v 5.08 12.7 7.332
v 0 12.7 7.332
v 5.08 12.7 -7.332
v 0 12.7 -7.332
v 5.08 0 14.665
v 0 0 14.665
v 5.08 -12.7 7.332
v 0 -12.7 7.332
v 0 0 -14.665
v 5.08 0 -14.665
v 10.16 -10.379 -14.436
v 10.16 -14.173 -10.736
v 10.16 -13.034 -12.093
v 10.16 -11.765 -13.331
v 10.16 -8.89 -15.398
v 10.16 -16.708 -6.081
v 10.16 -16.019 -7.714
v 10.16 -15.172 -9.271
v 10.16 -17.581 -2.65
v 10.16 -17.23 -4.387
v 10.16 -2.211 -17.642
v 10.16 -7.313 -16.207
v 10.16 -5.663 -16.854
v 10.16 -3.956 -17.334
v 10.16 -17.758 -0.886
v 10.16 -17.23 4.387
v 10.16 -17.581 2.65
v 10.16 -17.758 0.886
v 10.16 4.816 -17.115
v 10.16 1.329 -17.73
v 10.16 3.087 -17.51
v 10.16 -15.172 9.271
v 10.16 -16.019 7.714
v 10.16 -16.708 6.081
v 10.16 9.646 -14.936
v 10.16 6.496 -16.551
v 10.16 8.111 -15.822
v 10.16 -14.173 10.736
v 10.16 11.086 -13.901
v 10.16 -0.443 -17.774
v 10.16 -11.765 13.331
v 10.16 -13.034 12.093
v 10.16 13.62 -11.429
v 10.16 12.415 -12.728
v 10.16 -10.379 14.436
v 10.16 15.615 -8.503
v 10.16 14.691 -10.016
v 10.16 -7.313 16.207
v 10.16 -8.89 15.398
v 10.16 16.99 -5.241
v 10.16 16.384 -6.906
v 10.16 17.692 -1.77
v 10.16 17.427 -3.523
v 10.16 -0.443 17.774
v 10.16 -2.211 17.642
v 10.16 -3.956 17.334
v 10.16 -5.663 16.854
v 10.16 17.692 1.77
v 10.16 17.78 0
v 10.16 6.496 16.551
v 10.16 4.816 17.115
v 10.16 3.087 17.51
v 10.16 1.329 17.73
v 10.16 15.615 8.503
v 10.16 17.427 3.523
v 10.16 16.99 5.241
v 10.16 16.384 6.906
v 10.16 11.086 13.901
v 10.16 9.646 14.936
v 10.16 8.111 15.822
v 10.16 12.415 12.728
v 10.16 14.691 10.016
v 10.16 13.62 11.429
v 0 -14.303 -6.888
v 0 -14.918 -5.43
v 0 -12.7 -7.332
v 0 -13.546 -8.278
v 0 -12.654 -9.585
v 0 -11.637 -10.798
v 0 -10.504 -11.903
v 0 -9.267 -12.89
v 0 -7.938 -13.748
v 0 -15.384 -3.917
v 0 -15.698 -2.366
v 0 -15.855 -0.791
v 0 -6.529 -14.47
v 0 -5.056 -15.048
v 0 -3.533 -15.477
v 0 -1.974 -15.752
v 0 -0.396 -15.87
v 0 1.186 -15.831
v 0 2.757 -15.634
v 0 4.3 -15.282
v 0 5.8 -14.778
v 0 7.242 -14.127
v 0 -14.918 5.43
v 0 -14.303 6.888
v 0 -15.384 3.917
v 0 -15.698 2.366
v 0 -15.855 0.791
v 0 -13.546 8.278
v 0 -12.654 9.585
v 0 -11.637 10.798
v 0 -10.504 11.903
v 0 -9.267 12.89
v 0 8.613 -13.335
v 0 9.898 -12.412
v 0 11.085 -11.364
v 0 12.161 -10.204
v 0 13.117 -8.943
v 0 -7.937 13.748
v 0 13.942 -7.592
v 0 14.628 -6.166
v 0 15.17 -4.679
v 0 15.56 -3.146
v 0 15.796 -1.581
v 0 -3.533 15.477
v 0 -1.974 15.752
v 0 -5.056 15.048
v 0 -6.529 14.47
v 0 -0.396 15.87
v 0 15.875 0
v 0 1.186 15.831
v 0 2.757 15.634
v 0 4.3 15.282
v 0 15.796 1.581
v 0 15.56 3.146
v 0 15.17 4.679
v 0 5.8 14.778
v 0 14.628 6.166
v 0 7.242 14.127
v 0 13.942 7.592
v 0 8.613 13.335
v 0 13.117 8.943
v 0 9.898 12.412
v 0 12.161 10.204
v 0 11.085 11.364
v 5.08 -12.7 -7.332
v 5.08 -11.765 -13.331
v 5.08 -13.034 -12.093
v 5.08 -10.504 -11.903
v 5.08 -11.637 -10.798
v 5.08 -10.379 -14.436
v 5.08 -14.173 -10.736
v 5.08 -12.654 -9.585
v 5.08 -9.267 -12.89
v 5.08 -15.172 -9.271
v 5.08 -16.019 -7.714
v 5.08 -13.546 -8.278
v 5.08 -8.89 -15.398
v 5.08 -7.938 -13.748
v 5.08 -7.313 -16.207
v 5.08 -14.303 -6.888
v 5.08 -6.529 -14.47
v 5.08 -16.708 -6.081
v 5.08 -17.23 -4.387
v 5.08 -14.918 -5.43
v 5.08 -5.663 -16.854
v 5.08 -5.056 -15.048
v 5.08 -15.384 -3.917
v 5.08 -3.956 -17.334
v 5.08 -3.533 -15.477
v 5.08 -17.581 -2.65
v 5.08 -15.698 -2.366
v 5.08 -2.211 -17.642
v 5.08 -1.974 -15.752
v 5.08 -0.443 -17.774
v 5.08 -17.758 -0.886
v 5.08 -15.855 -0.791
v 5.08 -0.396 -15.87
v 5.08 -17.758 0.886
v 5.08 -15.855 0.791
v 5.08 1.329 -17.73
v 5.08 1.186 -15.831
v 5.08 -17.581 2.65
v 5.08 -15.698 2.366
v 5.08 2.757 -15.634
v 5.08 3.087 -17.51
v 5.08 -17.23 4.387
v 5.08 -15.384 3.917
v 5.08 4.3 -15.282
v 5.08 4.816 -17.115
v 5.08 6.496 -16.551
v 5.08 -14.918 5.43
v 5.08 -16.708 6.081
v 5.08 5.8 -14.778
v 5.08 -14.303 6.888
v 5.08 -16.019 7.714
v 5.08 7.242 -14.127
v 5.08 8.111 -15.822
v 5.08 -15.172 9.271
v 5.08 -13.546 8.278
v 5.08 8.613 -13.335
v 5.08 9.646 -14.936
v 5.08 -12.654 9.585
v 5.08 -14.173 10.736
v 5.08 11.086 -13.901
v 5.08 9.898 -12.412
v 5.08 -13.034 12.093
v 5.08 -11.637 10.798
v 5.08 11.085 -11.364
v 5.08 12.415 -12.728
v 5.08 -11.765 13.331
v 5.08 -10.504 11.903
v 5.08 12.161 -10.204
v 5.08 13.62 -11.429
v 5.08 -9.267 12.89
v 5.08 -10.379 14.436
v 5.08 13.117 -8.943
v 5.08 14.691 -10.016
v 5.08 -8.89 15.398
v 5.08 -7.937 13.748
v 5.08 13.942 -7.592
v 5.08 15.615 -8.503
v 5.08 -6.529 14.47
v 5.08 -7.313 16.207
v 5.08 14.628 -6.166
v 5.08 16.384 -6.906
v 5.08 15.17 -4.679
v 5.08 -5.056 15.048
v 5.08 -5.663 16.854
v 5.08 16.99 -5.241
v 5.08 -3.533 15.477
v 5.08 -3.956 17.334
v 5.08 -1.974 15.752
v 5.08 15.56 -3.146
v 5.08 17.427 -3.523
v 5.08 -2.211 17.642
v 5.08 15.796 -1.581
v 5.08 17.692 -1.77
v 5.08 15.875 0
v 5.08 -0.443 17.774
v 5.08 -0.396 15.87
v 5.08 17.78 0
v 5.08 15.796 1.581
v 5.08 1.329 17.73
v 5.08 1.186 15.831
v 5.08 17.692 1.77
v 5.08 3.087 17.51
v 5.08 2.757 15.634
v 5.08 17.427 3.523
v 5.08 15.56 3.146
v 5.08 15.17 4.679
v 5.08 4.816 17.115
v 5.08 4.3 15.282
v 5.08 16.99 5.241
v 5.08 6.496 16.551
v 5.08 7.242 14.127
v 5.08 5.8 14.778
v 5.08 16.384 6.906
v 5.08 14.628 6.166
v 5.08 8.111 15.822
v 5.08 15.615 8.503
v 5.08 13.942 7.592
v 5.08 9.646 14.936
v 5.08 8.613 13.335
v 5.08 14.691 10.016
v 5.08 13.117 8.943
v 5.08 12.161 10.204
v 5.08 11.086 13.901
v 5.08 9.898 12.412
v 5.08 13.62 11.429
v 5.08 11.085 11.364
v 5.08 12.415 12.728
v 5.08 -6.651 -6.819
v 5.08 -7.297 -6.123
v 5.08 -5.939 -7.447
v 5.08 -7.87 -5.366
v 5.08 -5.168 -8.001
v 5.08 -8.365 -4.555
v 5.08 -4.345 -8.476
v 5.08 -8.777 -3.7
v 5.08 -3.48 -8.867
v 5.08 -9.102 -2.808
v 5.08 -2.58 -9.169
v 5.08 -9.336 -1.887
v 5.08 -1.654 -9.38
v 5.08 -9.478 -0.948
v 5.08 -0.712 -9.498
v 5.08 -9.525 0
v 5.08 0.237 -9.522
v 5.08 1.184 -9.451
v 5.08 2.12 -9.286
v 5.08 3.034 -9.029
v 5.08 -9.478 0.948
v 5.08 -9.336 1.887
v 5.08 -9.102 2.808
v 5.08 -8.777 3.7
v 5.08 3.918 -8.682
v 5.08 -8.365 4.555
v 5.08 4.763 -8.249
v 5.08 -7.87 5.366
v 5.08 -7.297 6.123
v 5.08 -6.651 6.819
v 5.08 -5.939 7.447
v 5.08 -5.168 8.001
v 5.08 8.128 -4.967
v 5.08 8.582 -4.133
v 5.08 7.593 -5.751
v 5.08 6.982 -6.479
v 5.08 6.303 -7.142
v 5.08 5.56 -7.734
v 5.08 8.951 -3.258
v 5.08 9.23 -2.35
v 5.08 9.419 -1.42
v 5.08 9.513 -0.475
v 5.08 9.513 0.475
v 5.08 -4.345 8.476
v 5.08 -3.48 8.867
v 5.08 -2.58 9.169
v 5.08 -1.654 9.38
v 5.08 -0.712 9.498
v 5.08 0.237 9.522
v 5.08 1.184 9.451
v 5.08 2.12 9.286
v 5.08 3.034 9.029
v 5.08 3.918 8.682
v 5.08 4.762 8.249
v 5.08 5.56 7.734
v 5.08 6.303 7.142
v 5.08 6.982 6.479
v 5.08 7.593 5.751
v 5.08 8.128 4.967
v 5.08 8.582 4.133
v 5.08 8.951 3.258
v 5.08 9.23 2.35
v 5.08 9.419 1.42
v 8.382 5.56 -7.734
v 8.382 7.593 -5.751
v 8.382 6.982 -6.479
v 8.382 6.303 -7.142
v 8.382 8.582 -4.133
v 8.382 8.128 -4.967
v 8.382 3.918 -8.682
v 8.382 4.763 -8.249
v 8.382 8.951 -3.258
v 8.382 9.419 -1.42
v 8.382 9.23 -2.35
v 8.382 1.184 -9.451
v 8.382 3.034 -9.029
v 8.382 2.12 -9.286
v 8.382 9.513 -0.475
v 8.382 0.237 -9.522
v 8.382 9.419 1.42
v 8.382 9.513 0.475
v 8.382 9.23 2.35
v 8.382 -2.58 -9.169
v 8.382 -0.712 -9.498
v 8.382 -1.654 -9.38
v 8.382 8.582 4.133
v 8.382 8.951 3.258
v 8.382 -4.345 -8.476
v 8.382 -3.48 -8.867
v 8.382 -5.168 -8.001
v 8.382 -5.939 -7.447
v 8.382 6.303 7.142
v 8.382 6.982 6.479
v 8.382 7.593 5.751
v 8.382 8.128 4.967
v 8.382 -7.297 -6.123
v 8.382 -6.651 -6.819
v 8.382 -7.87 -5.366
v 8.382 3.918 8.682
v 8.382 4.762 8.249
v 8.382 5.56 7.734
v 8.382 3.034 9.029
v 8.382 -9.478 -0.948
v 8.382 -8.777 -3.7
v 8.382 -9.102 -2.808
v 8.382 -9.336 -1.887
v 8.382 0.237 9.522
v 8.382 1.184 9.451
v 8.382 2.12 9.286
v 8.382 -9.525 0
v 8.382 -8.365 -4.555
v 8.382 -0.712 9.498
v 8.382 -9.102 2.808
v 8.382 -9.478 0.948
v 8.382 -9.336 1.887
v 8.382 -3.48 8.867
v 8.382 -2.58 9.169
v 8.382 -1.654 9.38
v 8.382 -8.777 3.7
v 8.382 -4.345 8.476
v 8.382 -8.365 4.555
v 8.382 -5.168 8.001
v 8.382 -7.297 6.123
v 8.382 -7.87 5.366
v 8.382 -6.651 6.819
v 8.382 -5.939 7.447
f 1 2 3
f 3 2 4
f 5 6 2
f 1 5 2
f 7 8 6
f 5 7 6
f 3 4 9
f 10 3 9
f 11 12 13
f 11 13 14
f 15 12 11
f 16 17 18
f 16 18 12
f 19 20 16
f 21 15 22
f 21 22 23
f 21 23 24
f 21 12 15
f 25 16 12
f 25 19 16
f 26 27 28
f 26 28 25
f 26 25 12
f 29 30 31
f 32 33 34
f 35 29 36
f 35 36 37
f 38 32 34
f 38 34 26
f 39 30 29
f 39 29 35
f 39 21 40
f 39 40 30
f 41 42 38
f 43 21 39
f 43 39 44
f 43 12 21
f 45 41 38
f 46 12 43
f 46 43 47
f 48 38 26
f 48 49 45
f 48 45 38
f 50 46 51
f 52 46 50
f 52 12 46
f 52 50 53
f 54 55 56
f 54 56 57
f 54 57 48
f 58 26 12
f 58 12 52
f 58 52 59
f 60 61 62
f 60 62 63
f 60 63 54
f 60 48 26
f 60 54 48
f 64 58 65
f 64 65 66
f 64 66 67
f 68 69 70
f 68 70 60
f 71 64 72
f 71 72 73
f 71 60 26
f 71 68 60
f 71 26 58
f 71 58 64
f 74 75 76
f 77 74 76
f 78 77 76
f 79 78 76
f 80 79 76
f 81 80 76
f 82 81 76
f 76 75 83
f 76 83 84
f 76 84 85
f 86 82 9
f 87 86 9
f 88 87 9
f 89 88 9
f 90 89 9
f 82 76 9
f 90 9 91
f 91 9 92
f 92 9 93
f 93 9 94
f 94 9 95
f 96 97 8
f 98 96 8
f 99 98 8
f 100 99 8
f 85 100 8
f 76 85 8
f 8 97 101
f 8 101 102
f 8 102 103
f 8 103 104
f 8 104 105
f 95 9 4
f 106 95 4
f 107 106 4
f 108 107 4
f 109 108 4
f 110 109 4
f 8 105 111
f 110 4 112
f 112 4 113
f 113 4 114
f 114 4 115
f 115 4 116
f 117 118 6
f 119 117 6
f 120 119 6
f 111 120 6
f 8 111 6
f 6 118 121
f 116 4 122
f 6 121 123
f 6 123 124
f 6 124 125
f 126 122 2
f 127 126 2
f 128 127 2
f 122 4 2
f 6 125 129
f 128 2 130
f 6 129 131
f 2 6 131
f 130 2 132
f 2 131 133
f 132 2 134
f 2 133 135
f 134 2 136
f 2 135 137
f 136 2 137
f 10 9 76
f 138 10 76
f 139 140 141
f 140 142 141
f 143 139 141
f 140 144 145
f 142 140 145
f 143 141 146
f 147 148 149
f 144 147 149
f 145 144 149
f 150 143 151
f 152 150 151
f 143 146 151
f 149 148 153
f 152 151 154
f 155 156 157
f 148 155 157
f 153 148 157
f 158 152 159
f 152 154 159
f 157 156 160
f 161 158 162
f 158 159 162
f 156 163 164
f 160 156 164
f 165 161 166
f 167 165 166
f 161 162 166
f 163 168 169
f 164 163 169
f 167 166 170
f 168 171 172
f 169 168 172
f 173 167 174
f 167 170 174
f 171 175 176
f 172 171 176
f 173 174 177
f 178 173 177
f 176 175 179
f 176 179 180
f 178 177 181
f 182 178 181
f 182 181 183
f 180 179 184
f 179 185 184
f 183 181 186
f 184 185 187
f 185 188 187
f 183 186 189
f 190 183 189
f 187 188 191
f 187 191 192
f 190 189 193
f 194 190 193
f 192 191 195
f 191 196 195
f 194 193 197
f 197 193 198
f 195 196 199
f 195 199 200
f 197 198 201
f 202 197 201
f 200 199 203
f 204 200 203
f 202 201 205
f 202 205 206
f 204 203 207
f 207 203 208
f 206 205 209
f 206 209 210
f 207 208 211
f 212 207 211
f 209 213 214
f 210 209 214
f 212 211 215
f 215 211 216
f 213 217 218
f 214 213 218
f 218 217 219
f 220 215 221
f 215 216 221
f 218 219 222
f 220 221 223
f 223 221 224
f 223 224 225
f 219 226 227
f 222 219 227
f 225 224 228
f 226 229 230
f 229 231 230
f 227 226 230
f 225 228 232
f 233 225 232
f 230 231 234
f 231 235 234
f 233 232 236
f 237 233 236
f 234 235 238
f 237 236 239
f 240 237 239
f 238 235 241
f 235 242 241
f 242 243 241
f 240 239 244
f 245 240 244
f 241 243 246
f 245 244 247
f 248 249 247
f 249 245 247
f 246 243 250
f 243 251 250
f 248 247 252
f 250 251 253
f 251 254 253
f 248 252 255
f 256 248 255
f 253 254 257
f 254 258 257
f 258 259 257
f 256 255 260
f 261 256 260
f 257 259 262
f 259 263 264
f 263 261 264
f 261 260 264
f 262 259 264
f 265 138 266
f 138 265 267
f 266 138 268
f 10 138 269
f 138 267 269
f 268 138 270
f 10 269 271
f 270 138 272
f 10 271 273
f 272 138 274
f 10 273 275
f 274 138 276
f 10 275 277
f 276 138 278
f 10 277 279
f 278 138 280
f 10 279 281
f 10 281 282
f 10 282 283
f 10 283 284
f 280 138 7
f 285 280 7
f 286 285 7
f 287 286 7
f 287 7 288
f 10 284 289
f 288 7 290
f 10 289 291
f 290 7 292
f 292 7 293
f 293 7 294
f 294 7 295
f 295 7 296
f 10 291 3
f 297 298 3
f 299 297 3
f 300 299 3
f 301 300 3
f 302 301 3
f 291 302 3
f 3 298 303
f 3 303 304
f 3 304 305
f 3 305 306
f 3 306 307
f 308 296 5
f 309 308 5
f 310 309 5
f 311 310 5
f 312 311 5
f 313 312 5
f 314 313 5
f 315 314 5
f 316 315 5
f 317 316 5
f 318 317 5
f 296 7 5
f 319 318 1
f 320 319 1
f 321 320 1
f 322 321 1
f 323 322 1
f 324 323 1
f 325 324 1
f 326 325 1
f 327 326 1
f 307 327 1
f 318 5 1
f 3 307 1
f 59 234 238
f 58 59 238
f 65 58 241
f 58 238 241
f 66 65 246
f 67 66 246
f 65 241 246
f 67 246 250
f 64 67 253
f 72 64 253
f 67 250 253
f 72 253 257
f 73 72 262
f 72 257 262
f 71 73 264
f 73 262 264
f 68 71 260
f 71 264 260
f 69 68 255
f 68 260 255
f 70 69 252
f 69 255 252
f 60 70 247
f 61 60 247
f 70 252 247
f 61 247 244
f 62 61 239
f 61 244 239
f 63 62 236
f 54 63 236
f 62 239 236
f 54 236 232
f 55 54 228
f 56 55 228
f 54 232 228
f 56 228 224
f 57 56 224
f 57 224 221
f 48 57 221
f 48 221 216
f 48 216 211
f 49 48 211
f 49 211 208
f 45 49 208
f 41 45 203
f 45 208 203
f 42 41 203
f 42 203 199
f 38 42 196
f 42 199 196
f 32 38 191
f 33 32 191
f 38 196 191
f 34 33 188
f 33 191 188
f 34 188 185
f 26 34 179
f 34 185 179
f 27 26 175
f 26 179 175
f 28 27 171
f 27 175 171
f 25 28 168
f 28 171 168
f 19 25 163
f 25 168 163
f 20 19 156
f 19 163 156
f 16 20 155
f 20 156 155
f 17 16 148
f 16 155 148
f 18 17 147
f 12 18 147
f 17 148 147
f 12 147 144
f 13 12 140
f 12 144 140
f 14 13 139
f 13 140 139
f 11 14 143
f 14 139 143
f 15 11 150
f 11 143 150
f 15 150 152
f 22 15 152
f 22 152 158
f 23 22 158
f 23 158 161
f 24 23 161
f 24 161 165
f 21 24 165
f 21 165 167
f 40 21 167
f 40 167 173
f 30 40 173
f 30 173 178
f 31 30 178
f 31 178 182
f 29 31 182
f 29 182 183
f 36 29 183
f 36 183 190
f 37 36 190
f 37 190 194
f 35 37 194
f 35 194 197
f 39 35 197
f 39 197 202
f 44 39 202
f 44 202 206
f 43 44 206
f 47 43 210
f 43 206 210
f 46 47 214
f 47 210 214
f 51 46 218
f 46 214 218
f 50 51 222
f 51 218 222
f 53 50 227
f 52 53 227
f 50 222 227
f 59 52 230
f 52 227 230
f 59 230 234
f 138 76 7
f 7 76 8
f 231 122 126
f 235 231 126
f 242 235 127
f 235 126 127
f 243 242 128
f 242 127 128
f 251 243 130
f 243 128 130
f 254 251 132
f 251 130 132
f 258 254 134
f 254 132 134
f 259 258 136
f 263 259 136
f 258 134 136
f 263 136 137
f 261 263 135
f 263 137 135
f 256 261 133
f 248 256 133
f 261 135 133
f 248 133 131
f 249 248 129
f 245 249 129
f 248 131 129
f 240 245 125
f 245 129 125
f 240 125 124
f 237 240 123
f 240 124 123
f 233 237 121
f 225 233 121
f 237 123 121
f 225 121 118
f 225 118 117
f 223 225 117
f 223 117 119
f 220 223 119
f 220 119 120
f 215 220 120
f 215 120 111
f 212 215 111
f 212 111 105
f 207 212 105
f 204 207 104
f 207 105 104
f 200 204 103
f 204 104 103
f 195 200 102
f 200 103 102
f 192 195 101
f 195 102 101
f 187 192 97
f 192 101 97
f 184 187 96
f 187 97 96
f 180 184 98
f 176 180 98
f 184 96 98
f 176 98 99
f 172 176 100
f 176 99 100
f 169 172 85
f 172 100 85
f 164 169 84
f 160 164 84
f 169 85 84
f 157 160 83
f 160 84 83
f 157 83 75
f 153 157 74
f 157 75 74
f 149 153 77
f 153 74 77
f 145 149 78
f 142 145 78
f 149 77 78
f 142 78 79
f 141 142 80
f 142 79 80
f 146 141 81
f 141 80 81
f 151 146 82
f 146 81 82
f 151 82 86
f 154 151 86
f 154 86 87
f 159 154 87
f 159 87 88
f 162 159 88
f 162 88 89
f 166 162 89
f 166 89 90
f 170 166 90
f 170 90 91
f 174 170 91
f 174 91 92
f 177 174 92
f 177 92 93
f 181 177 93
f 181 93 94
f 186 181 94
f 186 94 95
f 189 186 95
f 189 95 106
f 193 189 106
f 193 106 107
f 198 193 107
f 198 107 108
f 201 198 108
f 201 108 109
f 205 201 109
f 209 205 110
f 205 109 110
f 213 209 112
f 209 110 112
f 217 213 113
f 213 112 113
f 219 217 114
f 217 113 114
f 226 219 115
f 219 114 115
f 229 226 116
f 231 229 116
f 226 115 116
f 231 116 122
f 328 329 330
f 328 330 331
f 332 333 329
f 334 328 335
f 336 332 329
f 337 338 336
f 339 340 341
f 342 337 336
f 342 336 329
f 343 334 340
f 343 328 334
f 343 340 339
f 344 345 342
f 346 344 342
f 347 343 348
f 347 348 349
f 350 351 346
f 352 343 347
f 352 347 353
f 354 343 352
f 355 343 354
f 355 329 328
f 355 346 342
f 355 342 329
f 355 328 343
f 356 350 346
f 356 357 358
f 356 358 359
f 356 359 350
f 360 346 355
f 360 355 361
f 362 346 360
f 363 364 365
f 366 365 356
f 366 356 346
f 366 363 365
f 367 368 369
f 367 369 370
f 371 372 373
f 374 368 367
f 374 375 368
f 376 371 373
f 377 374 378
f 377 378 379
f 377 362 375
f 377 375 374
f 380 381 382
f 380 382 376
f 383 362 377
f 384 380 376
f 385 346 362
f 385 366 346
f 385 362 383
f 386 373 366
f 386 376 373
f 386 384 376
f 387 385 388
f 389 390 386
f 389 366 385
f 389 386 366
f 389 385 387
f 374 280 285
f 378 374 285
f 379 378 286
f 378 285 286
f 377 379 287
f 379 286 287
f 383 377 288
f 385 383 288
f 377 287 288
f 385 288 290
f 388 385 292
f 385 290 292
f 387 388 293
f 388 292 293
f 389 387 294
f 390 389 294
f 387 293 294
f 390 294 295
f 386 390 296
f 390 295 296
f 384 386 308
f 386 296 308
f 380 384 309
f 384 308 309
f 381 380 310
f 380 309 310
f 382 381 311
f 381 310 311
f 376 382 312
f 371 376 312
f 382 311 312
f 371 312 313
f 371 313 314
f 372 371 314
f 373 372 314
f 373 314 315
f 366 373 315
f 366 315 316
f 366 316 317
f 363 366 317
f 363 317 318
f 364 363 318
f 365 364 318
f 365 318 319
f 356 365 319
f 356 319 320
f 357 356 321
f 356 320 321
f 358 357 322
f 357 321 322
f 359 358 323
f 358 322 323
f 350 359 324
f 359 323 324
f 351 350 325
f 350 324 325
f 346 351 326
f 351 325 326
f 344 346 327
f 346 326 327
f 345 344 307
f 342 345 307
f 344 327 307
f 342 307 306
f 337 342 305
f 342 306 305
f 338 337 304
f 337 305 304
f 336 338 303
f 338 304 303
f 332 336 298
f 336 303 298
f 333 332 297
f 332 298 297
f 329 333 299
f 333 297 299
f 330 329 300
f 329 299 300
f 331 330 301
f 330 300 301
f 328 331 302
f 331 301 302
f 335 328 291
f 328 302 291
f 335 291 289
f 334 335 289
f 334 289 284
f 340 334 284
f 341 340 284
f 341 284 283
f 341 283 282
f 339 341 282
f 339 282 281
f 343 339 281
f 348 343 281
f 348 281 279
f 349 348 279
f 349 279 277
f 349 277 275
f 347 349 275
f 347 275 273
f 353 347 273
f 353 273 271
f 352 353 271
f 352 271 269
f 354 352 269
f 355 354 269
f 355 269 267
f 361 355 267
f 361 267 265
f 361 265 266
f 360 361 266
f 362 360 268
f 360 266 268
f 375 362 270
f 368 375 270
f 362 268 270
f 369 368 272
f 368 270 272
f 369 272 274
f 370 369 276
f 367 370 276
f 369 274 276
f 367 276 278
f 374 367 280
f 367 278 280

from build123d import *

# Parameters (mm, degrees)
F0_R     = 15.875
F1_DEPTH = 5.08
F2_R     = 17.78
F3_DEPTH = 5.08
F4_R     = 9.525
F5_DEPTH = 3.302


with BuildPart() as f1:
    # F0 (on Right) → F1 (new body)
    with BuildSketch(Plane.YZ):
        Circle(F0_R)
        Polygon((0, -14.664697), (-12.7, -7.332348), (-12.7, 7.332348), (0, 14.664697), (12.7, 7.332348), (12.7, -7.332348), align=None, mode=Mode.SUBTRACT)
    extrude(amount=F1_DEPTH)

    # F2 (on face) → F3 (join)
    with BuildSketch(Plane.YZ.offset(5.08)):
        Circle(F2_R)
    extrude(amount=F3_DEPTH)

    # F4 (on face) → F5 (cut)
    with BuildSketch(Plane(origin=(5.08, 0, 0), x_dir=(0, -1, 0), z_dir=(-1, 0, 0))):
        Circle(F4_R)
    extrude(amount=-F5_DEPTH, mode=Mode.SUBTRACT)


solid = f1.part
